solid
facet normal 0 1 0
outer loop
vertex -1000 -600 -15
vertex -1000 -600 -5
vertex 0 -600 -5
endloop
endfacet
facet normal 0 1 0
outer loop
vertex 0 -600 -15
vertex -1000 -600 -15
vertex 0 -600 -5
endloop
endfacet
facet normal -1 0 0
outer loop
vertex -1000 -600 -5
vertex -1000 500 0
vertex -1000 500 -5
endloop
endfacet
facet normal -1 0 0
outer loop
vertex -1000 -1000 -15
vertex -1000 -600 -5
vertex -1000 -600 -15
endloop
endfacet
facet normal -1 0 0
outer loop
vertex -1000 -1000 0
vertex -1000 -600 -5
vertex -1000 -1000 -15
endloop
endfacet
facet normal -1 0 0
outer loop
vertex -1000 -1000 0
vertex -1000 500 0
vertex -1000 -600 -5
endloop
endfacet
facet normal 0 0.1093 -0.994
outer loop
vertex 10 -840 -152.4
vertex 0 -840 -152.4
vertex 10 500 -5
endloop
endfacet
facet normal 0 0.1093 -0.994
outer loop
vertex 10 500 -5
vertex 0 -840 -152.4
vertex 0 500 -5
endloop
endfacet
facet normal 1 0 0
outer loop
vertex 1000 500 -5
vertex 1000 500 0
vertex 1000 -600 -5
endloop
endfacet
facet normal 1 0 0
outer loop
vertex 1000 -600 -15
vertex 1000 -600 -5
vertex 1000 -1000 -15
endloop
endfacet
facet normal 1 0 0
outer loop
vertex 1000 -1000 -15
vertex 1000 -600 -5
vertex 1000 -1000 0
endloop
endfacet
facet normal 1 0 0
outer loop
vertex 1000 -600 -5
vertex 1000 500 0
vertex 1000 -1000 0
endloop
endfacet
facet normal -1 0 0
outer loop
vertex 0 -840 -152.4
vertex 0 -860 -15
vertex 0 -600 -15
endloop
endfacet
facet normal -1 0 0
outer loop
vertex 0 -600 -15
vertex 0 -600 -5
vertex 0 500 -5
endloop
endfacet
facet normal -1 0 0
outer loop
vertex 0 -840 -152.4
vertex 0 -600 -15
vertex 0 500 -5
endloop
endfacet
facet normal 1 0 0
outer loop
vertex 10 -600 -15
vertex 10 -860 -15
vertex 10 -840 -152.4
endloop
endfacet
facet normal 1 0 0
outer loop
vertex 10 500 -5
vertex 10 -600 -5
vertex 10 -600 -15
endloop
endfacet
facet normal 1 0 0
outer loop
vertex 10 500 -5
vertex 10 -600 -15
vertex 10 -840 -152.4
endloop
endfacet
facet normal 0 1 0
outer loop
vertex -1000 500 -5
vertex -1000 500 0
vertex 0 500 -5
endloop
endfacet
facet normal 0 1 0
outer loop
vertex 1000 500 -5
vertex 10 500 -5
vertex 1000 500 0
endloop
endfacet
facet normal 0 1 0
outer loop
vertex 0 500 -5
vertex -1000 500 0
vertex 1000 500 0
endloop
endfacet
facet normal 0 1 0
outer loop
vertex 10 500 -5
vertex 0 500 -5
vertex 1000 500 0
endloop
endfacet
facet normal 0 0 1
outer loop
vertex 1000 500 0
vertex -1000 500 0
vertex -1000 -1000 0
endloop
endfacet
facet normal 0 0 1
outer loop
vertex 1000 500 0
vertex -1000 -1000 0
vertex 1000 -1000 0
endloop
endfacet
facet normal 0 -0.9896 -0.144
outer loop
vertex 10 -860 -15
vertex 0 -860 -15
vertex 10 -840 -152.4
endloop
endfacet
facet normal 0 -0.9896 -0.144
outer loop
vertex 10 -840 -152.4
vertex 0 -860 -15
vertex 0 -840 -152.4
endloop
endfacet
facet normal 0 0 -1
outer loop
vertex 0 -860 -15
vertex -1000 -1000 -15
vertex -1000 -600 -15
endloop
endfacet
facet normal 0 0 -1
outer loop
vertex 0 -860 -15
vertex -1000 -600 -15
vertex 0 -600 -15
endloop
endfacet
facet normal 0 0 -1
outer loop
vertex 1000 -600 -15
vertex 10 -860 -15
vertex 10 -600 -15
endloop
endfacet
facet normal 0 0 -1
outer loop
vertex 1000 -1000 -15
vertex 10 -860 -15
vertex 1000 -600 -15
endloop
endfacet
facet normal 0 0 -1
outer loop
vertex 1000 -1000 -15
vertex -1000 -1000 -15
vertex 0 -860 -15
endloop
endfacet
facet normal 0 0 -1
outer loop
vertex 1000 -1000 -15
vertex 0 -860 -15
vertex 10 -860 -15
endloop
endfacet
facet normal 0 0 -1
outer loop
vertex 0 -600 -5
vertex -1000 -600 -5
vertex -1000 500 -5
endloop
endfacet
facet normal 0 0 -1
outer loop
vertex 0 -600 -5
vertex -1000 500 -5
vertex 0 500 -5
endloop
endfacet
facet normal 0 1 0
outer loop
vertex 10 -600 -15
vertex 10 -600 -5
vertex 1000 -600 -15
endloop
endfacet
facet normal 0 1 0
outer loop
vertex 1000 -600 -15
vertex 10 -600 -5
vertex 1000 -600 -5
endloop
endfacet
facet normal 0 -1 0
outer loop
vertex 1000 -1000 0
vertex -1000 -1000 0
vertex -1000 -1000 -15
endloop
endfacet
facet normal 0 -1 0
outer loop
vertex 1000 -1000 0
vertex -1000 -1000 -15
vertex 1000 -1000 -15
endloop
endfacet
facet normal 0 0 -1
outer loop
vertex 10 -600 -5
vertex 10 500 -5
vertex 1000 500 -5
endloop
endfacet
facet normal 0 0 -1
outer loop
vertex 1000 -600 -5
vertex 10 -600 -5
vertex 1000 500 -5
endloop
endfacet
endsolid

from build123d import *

# Parameters (mm, degrees)
F0_W     = 2000
F0_H     = 1500
F1_DEPTH = 5
F2_W     = 2000
F2_H     = 400
F3_DEPTH = 10
F5_DEPTH = 10


with BuildPart() as f1:
    # F0 (on Top) → F1 (new body)
    with BuildSketch(Plane.XY):
        with Locations((0, -250)):
            Rectangle(F0_W, F0_H)
    extrude(amount=-F1_DEPTH)

    # F2 (on face) → F3 (join)
    with BuildSketch(Plane(origin=(0, 0, -5), x_dir=(1, 0, 0), z_dir=(0, 0, -1))):
        with Locations((0, 800)):
            Rectangle(F2_W, F2_H)
    extrude(amount=F3_DEPTH)

    # F4 (on Right) → F5 (join)
    with BuildSketch(Plane.YZ):
        Polygon((-600, -15), (-860, -15), (-840, -152.4), (500, -5), (-600, -5), align=None)
    extrude(amount=F5_DEPTH)


solid = f1.part
